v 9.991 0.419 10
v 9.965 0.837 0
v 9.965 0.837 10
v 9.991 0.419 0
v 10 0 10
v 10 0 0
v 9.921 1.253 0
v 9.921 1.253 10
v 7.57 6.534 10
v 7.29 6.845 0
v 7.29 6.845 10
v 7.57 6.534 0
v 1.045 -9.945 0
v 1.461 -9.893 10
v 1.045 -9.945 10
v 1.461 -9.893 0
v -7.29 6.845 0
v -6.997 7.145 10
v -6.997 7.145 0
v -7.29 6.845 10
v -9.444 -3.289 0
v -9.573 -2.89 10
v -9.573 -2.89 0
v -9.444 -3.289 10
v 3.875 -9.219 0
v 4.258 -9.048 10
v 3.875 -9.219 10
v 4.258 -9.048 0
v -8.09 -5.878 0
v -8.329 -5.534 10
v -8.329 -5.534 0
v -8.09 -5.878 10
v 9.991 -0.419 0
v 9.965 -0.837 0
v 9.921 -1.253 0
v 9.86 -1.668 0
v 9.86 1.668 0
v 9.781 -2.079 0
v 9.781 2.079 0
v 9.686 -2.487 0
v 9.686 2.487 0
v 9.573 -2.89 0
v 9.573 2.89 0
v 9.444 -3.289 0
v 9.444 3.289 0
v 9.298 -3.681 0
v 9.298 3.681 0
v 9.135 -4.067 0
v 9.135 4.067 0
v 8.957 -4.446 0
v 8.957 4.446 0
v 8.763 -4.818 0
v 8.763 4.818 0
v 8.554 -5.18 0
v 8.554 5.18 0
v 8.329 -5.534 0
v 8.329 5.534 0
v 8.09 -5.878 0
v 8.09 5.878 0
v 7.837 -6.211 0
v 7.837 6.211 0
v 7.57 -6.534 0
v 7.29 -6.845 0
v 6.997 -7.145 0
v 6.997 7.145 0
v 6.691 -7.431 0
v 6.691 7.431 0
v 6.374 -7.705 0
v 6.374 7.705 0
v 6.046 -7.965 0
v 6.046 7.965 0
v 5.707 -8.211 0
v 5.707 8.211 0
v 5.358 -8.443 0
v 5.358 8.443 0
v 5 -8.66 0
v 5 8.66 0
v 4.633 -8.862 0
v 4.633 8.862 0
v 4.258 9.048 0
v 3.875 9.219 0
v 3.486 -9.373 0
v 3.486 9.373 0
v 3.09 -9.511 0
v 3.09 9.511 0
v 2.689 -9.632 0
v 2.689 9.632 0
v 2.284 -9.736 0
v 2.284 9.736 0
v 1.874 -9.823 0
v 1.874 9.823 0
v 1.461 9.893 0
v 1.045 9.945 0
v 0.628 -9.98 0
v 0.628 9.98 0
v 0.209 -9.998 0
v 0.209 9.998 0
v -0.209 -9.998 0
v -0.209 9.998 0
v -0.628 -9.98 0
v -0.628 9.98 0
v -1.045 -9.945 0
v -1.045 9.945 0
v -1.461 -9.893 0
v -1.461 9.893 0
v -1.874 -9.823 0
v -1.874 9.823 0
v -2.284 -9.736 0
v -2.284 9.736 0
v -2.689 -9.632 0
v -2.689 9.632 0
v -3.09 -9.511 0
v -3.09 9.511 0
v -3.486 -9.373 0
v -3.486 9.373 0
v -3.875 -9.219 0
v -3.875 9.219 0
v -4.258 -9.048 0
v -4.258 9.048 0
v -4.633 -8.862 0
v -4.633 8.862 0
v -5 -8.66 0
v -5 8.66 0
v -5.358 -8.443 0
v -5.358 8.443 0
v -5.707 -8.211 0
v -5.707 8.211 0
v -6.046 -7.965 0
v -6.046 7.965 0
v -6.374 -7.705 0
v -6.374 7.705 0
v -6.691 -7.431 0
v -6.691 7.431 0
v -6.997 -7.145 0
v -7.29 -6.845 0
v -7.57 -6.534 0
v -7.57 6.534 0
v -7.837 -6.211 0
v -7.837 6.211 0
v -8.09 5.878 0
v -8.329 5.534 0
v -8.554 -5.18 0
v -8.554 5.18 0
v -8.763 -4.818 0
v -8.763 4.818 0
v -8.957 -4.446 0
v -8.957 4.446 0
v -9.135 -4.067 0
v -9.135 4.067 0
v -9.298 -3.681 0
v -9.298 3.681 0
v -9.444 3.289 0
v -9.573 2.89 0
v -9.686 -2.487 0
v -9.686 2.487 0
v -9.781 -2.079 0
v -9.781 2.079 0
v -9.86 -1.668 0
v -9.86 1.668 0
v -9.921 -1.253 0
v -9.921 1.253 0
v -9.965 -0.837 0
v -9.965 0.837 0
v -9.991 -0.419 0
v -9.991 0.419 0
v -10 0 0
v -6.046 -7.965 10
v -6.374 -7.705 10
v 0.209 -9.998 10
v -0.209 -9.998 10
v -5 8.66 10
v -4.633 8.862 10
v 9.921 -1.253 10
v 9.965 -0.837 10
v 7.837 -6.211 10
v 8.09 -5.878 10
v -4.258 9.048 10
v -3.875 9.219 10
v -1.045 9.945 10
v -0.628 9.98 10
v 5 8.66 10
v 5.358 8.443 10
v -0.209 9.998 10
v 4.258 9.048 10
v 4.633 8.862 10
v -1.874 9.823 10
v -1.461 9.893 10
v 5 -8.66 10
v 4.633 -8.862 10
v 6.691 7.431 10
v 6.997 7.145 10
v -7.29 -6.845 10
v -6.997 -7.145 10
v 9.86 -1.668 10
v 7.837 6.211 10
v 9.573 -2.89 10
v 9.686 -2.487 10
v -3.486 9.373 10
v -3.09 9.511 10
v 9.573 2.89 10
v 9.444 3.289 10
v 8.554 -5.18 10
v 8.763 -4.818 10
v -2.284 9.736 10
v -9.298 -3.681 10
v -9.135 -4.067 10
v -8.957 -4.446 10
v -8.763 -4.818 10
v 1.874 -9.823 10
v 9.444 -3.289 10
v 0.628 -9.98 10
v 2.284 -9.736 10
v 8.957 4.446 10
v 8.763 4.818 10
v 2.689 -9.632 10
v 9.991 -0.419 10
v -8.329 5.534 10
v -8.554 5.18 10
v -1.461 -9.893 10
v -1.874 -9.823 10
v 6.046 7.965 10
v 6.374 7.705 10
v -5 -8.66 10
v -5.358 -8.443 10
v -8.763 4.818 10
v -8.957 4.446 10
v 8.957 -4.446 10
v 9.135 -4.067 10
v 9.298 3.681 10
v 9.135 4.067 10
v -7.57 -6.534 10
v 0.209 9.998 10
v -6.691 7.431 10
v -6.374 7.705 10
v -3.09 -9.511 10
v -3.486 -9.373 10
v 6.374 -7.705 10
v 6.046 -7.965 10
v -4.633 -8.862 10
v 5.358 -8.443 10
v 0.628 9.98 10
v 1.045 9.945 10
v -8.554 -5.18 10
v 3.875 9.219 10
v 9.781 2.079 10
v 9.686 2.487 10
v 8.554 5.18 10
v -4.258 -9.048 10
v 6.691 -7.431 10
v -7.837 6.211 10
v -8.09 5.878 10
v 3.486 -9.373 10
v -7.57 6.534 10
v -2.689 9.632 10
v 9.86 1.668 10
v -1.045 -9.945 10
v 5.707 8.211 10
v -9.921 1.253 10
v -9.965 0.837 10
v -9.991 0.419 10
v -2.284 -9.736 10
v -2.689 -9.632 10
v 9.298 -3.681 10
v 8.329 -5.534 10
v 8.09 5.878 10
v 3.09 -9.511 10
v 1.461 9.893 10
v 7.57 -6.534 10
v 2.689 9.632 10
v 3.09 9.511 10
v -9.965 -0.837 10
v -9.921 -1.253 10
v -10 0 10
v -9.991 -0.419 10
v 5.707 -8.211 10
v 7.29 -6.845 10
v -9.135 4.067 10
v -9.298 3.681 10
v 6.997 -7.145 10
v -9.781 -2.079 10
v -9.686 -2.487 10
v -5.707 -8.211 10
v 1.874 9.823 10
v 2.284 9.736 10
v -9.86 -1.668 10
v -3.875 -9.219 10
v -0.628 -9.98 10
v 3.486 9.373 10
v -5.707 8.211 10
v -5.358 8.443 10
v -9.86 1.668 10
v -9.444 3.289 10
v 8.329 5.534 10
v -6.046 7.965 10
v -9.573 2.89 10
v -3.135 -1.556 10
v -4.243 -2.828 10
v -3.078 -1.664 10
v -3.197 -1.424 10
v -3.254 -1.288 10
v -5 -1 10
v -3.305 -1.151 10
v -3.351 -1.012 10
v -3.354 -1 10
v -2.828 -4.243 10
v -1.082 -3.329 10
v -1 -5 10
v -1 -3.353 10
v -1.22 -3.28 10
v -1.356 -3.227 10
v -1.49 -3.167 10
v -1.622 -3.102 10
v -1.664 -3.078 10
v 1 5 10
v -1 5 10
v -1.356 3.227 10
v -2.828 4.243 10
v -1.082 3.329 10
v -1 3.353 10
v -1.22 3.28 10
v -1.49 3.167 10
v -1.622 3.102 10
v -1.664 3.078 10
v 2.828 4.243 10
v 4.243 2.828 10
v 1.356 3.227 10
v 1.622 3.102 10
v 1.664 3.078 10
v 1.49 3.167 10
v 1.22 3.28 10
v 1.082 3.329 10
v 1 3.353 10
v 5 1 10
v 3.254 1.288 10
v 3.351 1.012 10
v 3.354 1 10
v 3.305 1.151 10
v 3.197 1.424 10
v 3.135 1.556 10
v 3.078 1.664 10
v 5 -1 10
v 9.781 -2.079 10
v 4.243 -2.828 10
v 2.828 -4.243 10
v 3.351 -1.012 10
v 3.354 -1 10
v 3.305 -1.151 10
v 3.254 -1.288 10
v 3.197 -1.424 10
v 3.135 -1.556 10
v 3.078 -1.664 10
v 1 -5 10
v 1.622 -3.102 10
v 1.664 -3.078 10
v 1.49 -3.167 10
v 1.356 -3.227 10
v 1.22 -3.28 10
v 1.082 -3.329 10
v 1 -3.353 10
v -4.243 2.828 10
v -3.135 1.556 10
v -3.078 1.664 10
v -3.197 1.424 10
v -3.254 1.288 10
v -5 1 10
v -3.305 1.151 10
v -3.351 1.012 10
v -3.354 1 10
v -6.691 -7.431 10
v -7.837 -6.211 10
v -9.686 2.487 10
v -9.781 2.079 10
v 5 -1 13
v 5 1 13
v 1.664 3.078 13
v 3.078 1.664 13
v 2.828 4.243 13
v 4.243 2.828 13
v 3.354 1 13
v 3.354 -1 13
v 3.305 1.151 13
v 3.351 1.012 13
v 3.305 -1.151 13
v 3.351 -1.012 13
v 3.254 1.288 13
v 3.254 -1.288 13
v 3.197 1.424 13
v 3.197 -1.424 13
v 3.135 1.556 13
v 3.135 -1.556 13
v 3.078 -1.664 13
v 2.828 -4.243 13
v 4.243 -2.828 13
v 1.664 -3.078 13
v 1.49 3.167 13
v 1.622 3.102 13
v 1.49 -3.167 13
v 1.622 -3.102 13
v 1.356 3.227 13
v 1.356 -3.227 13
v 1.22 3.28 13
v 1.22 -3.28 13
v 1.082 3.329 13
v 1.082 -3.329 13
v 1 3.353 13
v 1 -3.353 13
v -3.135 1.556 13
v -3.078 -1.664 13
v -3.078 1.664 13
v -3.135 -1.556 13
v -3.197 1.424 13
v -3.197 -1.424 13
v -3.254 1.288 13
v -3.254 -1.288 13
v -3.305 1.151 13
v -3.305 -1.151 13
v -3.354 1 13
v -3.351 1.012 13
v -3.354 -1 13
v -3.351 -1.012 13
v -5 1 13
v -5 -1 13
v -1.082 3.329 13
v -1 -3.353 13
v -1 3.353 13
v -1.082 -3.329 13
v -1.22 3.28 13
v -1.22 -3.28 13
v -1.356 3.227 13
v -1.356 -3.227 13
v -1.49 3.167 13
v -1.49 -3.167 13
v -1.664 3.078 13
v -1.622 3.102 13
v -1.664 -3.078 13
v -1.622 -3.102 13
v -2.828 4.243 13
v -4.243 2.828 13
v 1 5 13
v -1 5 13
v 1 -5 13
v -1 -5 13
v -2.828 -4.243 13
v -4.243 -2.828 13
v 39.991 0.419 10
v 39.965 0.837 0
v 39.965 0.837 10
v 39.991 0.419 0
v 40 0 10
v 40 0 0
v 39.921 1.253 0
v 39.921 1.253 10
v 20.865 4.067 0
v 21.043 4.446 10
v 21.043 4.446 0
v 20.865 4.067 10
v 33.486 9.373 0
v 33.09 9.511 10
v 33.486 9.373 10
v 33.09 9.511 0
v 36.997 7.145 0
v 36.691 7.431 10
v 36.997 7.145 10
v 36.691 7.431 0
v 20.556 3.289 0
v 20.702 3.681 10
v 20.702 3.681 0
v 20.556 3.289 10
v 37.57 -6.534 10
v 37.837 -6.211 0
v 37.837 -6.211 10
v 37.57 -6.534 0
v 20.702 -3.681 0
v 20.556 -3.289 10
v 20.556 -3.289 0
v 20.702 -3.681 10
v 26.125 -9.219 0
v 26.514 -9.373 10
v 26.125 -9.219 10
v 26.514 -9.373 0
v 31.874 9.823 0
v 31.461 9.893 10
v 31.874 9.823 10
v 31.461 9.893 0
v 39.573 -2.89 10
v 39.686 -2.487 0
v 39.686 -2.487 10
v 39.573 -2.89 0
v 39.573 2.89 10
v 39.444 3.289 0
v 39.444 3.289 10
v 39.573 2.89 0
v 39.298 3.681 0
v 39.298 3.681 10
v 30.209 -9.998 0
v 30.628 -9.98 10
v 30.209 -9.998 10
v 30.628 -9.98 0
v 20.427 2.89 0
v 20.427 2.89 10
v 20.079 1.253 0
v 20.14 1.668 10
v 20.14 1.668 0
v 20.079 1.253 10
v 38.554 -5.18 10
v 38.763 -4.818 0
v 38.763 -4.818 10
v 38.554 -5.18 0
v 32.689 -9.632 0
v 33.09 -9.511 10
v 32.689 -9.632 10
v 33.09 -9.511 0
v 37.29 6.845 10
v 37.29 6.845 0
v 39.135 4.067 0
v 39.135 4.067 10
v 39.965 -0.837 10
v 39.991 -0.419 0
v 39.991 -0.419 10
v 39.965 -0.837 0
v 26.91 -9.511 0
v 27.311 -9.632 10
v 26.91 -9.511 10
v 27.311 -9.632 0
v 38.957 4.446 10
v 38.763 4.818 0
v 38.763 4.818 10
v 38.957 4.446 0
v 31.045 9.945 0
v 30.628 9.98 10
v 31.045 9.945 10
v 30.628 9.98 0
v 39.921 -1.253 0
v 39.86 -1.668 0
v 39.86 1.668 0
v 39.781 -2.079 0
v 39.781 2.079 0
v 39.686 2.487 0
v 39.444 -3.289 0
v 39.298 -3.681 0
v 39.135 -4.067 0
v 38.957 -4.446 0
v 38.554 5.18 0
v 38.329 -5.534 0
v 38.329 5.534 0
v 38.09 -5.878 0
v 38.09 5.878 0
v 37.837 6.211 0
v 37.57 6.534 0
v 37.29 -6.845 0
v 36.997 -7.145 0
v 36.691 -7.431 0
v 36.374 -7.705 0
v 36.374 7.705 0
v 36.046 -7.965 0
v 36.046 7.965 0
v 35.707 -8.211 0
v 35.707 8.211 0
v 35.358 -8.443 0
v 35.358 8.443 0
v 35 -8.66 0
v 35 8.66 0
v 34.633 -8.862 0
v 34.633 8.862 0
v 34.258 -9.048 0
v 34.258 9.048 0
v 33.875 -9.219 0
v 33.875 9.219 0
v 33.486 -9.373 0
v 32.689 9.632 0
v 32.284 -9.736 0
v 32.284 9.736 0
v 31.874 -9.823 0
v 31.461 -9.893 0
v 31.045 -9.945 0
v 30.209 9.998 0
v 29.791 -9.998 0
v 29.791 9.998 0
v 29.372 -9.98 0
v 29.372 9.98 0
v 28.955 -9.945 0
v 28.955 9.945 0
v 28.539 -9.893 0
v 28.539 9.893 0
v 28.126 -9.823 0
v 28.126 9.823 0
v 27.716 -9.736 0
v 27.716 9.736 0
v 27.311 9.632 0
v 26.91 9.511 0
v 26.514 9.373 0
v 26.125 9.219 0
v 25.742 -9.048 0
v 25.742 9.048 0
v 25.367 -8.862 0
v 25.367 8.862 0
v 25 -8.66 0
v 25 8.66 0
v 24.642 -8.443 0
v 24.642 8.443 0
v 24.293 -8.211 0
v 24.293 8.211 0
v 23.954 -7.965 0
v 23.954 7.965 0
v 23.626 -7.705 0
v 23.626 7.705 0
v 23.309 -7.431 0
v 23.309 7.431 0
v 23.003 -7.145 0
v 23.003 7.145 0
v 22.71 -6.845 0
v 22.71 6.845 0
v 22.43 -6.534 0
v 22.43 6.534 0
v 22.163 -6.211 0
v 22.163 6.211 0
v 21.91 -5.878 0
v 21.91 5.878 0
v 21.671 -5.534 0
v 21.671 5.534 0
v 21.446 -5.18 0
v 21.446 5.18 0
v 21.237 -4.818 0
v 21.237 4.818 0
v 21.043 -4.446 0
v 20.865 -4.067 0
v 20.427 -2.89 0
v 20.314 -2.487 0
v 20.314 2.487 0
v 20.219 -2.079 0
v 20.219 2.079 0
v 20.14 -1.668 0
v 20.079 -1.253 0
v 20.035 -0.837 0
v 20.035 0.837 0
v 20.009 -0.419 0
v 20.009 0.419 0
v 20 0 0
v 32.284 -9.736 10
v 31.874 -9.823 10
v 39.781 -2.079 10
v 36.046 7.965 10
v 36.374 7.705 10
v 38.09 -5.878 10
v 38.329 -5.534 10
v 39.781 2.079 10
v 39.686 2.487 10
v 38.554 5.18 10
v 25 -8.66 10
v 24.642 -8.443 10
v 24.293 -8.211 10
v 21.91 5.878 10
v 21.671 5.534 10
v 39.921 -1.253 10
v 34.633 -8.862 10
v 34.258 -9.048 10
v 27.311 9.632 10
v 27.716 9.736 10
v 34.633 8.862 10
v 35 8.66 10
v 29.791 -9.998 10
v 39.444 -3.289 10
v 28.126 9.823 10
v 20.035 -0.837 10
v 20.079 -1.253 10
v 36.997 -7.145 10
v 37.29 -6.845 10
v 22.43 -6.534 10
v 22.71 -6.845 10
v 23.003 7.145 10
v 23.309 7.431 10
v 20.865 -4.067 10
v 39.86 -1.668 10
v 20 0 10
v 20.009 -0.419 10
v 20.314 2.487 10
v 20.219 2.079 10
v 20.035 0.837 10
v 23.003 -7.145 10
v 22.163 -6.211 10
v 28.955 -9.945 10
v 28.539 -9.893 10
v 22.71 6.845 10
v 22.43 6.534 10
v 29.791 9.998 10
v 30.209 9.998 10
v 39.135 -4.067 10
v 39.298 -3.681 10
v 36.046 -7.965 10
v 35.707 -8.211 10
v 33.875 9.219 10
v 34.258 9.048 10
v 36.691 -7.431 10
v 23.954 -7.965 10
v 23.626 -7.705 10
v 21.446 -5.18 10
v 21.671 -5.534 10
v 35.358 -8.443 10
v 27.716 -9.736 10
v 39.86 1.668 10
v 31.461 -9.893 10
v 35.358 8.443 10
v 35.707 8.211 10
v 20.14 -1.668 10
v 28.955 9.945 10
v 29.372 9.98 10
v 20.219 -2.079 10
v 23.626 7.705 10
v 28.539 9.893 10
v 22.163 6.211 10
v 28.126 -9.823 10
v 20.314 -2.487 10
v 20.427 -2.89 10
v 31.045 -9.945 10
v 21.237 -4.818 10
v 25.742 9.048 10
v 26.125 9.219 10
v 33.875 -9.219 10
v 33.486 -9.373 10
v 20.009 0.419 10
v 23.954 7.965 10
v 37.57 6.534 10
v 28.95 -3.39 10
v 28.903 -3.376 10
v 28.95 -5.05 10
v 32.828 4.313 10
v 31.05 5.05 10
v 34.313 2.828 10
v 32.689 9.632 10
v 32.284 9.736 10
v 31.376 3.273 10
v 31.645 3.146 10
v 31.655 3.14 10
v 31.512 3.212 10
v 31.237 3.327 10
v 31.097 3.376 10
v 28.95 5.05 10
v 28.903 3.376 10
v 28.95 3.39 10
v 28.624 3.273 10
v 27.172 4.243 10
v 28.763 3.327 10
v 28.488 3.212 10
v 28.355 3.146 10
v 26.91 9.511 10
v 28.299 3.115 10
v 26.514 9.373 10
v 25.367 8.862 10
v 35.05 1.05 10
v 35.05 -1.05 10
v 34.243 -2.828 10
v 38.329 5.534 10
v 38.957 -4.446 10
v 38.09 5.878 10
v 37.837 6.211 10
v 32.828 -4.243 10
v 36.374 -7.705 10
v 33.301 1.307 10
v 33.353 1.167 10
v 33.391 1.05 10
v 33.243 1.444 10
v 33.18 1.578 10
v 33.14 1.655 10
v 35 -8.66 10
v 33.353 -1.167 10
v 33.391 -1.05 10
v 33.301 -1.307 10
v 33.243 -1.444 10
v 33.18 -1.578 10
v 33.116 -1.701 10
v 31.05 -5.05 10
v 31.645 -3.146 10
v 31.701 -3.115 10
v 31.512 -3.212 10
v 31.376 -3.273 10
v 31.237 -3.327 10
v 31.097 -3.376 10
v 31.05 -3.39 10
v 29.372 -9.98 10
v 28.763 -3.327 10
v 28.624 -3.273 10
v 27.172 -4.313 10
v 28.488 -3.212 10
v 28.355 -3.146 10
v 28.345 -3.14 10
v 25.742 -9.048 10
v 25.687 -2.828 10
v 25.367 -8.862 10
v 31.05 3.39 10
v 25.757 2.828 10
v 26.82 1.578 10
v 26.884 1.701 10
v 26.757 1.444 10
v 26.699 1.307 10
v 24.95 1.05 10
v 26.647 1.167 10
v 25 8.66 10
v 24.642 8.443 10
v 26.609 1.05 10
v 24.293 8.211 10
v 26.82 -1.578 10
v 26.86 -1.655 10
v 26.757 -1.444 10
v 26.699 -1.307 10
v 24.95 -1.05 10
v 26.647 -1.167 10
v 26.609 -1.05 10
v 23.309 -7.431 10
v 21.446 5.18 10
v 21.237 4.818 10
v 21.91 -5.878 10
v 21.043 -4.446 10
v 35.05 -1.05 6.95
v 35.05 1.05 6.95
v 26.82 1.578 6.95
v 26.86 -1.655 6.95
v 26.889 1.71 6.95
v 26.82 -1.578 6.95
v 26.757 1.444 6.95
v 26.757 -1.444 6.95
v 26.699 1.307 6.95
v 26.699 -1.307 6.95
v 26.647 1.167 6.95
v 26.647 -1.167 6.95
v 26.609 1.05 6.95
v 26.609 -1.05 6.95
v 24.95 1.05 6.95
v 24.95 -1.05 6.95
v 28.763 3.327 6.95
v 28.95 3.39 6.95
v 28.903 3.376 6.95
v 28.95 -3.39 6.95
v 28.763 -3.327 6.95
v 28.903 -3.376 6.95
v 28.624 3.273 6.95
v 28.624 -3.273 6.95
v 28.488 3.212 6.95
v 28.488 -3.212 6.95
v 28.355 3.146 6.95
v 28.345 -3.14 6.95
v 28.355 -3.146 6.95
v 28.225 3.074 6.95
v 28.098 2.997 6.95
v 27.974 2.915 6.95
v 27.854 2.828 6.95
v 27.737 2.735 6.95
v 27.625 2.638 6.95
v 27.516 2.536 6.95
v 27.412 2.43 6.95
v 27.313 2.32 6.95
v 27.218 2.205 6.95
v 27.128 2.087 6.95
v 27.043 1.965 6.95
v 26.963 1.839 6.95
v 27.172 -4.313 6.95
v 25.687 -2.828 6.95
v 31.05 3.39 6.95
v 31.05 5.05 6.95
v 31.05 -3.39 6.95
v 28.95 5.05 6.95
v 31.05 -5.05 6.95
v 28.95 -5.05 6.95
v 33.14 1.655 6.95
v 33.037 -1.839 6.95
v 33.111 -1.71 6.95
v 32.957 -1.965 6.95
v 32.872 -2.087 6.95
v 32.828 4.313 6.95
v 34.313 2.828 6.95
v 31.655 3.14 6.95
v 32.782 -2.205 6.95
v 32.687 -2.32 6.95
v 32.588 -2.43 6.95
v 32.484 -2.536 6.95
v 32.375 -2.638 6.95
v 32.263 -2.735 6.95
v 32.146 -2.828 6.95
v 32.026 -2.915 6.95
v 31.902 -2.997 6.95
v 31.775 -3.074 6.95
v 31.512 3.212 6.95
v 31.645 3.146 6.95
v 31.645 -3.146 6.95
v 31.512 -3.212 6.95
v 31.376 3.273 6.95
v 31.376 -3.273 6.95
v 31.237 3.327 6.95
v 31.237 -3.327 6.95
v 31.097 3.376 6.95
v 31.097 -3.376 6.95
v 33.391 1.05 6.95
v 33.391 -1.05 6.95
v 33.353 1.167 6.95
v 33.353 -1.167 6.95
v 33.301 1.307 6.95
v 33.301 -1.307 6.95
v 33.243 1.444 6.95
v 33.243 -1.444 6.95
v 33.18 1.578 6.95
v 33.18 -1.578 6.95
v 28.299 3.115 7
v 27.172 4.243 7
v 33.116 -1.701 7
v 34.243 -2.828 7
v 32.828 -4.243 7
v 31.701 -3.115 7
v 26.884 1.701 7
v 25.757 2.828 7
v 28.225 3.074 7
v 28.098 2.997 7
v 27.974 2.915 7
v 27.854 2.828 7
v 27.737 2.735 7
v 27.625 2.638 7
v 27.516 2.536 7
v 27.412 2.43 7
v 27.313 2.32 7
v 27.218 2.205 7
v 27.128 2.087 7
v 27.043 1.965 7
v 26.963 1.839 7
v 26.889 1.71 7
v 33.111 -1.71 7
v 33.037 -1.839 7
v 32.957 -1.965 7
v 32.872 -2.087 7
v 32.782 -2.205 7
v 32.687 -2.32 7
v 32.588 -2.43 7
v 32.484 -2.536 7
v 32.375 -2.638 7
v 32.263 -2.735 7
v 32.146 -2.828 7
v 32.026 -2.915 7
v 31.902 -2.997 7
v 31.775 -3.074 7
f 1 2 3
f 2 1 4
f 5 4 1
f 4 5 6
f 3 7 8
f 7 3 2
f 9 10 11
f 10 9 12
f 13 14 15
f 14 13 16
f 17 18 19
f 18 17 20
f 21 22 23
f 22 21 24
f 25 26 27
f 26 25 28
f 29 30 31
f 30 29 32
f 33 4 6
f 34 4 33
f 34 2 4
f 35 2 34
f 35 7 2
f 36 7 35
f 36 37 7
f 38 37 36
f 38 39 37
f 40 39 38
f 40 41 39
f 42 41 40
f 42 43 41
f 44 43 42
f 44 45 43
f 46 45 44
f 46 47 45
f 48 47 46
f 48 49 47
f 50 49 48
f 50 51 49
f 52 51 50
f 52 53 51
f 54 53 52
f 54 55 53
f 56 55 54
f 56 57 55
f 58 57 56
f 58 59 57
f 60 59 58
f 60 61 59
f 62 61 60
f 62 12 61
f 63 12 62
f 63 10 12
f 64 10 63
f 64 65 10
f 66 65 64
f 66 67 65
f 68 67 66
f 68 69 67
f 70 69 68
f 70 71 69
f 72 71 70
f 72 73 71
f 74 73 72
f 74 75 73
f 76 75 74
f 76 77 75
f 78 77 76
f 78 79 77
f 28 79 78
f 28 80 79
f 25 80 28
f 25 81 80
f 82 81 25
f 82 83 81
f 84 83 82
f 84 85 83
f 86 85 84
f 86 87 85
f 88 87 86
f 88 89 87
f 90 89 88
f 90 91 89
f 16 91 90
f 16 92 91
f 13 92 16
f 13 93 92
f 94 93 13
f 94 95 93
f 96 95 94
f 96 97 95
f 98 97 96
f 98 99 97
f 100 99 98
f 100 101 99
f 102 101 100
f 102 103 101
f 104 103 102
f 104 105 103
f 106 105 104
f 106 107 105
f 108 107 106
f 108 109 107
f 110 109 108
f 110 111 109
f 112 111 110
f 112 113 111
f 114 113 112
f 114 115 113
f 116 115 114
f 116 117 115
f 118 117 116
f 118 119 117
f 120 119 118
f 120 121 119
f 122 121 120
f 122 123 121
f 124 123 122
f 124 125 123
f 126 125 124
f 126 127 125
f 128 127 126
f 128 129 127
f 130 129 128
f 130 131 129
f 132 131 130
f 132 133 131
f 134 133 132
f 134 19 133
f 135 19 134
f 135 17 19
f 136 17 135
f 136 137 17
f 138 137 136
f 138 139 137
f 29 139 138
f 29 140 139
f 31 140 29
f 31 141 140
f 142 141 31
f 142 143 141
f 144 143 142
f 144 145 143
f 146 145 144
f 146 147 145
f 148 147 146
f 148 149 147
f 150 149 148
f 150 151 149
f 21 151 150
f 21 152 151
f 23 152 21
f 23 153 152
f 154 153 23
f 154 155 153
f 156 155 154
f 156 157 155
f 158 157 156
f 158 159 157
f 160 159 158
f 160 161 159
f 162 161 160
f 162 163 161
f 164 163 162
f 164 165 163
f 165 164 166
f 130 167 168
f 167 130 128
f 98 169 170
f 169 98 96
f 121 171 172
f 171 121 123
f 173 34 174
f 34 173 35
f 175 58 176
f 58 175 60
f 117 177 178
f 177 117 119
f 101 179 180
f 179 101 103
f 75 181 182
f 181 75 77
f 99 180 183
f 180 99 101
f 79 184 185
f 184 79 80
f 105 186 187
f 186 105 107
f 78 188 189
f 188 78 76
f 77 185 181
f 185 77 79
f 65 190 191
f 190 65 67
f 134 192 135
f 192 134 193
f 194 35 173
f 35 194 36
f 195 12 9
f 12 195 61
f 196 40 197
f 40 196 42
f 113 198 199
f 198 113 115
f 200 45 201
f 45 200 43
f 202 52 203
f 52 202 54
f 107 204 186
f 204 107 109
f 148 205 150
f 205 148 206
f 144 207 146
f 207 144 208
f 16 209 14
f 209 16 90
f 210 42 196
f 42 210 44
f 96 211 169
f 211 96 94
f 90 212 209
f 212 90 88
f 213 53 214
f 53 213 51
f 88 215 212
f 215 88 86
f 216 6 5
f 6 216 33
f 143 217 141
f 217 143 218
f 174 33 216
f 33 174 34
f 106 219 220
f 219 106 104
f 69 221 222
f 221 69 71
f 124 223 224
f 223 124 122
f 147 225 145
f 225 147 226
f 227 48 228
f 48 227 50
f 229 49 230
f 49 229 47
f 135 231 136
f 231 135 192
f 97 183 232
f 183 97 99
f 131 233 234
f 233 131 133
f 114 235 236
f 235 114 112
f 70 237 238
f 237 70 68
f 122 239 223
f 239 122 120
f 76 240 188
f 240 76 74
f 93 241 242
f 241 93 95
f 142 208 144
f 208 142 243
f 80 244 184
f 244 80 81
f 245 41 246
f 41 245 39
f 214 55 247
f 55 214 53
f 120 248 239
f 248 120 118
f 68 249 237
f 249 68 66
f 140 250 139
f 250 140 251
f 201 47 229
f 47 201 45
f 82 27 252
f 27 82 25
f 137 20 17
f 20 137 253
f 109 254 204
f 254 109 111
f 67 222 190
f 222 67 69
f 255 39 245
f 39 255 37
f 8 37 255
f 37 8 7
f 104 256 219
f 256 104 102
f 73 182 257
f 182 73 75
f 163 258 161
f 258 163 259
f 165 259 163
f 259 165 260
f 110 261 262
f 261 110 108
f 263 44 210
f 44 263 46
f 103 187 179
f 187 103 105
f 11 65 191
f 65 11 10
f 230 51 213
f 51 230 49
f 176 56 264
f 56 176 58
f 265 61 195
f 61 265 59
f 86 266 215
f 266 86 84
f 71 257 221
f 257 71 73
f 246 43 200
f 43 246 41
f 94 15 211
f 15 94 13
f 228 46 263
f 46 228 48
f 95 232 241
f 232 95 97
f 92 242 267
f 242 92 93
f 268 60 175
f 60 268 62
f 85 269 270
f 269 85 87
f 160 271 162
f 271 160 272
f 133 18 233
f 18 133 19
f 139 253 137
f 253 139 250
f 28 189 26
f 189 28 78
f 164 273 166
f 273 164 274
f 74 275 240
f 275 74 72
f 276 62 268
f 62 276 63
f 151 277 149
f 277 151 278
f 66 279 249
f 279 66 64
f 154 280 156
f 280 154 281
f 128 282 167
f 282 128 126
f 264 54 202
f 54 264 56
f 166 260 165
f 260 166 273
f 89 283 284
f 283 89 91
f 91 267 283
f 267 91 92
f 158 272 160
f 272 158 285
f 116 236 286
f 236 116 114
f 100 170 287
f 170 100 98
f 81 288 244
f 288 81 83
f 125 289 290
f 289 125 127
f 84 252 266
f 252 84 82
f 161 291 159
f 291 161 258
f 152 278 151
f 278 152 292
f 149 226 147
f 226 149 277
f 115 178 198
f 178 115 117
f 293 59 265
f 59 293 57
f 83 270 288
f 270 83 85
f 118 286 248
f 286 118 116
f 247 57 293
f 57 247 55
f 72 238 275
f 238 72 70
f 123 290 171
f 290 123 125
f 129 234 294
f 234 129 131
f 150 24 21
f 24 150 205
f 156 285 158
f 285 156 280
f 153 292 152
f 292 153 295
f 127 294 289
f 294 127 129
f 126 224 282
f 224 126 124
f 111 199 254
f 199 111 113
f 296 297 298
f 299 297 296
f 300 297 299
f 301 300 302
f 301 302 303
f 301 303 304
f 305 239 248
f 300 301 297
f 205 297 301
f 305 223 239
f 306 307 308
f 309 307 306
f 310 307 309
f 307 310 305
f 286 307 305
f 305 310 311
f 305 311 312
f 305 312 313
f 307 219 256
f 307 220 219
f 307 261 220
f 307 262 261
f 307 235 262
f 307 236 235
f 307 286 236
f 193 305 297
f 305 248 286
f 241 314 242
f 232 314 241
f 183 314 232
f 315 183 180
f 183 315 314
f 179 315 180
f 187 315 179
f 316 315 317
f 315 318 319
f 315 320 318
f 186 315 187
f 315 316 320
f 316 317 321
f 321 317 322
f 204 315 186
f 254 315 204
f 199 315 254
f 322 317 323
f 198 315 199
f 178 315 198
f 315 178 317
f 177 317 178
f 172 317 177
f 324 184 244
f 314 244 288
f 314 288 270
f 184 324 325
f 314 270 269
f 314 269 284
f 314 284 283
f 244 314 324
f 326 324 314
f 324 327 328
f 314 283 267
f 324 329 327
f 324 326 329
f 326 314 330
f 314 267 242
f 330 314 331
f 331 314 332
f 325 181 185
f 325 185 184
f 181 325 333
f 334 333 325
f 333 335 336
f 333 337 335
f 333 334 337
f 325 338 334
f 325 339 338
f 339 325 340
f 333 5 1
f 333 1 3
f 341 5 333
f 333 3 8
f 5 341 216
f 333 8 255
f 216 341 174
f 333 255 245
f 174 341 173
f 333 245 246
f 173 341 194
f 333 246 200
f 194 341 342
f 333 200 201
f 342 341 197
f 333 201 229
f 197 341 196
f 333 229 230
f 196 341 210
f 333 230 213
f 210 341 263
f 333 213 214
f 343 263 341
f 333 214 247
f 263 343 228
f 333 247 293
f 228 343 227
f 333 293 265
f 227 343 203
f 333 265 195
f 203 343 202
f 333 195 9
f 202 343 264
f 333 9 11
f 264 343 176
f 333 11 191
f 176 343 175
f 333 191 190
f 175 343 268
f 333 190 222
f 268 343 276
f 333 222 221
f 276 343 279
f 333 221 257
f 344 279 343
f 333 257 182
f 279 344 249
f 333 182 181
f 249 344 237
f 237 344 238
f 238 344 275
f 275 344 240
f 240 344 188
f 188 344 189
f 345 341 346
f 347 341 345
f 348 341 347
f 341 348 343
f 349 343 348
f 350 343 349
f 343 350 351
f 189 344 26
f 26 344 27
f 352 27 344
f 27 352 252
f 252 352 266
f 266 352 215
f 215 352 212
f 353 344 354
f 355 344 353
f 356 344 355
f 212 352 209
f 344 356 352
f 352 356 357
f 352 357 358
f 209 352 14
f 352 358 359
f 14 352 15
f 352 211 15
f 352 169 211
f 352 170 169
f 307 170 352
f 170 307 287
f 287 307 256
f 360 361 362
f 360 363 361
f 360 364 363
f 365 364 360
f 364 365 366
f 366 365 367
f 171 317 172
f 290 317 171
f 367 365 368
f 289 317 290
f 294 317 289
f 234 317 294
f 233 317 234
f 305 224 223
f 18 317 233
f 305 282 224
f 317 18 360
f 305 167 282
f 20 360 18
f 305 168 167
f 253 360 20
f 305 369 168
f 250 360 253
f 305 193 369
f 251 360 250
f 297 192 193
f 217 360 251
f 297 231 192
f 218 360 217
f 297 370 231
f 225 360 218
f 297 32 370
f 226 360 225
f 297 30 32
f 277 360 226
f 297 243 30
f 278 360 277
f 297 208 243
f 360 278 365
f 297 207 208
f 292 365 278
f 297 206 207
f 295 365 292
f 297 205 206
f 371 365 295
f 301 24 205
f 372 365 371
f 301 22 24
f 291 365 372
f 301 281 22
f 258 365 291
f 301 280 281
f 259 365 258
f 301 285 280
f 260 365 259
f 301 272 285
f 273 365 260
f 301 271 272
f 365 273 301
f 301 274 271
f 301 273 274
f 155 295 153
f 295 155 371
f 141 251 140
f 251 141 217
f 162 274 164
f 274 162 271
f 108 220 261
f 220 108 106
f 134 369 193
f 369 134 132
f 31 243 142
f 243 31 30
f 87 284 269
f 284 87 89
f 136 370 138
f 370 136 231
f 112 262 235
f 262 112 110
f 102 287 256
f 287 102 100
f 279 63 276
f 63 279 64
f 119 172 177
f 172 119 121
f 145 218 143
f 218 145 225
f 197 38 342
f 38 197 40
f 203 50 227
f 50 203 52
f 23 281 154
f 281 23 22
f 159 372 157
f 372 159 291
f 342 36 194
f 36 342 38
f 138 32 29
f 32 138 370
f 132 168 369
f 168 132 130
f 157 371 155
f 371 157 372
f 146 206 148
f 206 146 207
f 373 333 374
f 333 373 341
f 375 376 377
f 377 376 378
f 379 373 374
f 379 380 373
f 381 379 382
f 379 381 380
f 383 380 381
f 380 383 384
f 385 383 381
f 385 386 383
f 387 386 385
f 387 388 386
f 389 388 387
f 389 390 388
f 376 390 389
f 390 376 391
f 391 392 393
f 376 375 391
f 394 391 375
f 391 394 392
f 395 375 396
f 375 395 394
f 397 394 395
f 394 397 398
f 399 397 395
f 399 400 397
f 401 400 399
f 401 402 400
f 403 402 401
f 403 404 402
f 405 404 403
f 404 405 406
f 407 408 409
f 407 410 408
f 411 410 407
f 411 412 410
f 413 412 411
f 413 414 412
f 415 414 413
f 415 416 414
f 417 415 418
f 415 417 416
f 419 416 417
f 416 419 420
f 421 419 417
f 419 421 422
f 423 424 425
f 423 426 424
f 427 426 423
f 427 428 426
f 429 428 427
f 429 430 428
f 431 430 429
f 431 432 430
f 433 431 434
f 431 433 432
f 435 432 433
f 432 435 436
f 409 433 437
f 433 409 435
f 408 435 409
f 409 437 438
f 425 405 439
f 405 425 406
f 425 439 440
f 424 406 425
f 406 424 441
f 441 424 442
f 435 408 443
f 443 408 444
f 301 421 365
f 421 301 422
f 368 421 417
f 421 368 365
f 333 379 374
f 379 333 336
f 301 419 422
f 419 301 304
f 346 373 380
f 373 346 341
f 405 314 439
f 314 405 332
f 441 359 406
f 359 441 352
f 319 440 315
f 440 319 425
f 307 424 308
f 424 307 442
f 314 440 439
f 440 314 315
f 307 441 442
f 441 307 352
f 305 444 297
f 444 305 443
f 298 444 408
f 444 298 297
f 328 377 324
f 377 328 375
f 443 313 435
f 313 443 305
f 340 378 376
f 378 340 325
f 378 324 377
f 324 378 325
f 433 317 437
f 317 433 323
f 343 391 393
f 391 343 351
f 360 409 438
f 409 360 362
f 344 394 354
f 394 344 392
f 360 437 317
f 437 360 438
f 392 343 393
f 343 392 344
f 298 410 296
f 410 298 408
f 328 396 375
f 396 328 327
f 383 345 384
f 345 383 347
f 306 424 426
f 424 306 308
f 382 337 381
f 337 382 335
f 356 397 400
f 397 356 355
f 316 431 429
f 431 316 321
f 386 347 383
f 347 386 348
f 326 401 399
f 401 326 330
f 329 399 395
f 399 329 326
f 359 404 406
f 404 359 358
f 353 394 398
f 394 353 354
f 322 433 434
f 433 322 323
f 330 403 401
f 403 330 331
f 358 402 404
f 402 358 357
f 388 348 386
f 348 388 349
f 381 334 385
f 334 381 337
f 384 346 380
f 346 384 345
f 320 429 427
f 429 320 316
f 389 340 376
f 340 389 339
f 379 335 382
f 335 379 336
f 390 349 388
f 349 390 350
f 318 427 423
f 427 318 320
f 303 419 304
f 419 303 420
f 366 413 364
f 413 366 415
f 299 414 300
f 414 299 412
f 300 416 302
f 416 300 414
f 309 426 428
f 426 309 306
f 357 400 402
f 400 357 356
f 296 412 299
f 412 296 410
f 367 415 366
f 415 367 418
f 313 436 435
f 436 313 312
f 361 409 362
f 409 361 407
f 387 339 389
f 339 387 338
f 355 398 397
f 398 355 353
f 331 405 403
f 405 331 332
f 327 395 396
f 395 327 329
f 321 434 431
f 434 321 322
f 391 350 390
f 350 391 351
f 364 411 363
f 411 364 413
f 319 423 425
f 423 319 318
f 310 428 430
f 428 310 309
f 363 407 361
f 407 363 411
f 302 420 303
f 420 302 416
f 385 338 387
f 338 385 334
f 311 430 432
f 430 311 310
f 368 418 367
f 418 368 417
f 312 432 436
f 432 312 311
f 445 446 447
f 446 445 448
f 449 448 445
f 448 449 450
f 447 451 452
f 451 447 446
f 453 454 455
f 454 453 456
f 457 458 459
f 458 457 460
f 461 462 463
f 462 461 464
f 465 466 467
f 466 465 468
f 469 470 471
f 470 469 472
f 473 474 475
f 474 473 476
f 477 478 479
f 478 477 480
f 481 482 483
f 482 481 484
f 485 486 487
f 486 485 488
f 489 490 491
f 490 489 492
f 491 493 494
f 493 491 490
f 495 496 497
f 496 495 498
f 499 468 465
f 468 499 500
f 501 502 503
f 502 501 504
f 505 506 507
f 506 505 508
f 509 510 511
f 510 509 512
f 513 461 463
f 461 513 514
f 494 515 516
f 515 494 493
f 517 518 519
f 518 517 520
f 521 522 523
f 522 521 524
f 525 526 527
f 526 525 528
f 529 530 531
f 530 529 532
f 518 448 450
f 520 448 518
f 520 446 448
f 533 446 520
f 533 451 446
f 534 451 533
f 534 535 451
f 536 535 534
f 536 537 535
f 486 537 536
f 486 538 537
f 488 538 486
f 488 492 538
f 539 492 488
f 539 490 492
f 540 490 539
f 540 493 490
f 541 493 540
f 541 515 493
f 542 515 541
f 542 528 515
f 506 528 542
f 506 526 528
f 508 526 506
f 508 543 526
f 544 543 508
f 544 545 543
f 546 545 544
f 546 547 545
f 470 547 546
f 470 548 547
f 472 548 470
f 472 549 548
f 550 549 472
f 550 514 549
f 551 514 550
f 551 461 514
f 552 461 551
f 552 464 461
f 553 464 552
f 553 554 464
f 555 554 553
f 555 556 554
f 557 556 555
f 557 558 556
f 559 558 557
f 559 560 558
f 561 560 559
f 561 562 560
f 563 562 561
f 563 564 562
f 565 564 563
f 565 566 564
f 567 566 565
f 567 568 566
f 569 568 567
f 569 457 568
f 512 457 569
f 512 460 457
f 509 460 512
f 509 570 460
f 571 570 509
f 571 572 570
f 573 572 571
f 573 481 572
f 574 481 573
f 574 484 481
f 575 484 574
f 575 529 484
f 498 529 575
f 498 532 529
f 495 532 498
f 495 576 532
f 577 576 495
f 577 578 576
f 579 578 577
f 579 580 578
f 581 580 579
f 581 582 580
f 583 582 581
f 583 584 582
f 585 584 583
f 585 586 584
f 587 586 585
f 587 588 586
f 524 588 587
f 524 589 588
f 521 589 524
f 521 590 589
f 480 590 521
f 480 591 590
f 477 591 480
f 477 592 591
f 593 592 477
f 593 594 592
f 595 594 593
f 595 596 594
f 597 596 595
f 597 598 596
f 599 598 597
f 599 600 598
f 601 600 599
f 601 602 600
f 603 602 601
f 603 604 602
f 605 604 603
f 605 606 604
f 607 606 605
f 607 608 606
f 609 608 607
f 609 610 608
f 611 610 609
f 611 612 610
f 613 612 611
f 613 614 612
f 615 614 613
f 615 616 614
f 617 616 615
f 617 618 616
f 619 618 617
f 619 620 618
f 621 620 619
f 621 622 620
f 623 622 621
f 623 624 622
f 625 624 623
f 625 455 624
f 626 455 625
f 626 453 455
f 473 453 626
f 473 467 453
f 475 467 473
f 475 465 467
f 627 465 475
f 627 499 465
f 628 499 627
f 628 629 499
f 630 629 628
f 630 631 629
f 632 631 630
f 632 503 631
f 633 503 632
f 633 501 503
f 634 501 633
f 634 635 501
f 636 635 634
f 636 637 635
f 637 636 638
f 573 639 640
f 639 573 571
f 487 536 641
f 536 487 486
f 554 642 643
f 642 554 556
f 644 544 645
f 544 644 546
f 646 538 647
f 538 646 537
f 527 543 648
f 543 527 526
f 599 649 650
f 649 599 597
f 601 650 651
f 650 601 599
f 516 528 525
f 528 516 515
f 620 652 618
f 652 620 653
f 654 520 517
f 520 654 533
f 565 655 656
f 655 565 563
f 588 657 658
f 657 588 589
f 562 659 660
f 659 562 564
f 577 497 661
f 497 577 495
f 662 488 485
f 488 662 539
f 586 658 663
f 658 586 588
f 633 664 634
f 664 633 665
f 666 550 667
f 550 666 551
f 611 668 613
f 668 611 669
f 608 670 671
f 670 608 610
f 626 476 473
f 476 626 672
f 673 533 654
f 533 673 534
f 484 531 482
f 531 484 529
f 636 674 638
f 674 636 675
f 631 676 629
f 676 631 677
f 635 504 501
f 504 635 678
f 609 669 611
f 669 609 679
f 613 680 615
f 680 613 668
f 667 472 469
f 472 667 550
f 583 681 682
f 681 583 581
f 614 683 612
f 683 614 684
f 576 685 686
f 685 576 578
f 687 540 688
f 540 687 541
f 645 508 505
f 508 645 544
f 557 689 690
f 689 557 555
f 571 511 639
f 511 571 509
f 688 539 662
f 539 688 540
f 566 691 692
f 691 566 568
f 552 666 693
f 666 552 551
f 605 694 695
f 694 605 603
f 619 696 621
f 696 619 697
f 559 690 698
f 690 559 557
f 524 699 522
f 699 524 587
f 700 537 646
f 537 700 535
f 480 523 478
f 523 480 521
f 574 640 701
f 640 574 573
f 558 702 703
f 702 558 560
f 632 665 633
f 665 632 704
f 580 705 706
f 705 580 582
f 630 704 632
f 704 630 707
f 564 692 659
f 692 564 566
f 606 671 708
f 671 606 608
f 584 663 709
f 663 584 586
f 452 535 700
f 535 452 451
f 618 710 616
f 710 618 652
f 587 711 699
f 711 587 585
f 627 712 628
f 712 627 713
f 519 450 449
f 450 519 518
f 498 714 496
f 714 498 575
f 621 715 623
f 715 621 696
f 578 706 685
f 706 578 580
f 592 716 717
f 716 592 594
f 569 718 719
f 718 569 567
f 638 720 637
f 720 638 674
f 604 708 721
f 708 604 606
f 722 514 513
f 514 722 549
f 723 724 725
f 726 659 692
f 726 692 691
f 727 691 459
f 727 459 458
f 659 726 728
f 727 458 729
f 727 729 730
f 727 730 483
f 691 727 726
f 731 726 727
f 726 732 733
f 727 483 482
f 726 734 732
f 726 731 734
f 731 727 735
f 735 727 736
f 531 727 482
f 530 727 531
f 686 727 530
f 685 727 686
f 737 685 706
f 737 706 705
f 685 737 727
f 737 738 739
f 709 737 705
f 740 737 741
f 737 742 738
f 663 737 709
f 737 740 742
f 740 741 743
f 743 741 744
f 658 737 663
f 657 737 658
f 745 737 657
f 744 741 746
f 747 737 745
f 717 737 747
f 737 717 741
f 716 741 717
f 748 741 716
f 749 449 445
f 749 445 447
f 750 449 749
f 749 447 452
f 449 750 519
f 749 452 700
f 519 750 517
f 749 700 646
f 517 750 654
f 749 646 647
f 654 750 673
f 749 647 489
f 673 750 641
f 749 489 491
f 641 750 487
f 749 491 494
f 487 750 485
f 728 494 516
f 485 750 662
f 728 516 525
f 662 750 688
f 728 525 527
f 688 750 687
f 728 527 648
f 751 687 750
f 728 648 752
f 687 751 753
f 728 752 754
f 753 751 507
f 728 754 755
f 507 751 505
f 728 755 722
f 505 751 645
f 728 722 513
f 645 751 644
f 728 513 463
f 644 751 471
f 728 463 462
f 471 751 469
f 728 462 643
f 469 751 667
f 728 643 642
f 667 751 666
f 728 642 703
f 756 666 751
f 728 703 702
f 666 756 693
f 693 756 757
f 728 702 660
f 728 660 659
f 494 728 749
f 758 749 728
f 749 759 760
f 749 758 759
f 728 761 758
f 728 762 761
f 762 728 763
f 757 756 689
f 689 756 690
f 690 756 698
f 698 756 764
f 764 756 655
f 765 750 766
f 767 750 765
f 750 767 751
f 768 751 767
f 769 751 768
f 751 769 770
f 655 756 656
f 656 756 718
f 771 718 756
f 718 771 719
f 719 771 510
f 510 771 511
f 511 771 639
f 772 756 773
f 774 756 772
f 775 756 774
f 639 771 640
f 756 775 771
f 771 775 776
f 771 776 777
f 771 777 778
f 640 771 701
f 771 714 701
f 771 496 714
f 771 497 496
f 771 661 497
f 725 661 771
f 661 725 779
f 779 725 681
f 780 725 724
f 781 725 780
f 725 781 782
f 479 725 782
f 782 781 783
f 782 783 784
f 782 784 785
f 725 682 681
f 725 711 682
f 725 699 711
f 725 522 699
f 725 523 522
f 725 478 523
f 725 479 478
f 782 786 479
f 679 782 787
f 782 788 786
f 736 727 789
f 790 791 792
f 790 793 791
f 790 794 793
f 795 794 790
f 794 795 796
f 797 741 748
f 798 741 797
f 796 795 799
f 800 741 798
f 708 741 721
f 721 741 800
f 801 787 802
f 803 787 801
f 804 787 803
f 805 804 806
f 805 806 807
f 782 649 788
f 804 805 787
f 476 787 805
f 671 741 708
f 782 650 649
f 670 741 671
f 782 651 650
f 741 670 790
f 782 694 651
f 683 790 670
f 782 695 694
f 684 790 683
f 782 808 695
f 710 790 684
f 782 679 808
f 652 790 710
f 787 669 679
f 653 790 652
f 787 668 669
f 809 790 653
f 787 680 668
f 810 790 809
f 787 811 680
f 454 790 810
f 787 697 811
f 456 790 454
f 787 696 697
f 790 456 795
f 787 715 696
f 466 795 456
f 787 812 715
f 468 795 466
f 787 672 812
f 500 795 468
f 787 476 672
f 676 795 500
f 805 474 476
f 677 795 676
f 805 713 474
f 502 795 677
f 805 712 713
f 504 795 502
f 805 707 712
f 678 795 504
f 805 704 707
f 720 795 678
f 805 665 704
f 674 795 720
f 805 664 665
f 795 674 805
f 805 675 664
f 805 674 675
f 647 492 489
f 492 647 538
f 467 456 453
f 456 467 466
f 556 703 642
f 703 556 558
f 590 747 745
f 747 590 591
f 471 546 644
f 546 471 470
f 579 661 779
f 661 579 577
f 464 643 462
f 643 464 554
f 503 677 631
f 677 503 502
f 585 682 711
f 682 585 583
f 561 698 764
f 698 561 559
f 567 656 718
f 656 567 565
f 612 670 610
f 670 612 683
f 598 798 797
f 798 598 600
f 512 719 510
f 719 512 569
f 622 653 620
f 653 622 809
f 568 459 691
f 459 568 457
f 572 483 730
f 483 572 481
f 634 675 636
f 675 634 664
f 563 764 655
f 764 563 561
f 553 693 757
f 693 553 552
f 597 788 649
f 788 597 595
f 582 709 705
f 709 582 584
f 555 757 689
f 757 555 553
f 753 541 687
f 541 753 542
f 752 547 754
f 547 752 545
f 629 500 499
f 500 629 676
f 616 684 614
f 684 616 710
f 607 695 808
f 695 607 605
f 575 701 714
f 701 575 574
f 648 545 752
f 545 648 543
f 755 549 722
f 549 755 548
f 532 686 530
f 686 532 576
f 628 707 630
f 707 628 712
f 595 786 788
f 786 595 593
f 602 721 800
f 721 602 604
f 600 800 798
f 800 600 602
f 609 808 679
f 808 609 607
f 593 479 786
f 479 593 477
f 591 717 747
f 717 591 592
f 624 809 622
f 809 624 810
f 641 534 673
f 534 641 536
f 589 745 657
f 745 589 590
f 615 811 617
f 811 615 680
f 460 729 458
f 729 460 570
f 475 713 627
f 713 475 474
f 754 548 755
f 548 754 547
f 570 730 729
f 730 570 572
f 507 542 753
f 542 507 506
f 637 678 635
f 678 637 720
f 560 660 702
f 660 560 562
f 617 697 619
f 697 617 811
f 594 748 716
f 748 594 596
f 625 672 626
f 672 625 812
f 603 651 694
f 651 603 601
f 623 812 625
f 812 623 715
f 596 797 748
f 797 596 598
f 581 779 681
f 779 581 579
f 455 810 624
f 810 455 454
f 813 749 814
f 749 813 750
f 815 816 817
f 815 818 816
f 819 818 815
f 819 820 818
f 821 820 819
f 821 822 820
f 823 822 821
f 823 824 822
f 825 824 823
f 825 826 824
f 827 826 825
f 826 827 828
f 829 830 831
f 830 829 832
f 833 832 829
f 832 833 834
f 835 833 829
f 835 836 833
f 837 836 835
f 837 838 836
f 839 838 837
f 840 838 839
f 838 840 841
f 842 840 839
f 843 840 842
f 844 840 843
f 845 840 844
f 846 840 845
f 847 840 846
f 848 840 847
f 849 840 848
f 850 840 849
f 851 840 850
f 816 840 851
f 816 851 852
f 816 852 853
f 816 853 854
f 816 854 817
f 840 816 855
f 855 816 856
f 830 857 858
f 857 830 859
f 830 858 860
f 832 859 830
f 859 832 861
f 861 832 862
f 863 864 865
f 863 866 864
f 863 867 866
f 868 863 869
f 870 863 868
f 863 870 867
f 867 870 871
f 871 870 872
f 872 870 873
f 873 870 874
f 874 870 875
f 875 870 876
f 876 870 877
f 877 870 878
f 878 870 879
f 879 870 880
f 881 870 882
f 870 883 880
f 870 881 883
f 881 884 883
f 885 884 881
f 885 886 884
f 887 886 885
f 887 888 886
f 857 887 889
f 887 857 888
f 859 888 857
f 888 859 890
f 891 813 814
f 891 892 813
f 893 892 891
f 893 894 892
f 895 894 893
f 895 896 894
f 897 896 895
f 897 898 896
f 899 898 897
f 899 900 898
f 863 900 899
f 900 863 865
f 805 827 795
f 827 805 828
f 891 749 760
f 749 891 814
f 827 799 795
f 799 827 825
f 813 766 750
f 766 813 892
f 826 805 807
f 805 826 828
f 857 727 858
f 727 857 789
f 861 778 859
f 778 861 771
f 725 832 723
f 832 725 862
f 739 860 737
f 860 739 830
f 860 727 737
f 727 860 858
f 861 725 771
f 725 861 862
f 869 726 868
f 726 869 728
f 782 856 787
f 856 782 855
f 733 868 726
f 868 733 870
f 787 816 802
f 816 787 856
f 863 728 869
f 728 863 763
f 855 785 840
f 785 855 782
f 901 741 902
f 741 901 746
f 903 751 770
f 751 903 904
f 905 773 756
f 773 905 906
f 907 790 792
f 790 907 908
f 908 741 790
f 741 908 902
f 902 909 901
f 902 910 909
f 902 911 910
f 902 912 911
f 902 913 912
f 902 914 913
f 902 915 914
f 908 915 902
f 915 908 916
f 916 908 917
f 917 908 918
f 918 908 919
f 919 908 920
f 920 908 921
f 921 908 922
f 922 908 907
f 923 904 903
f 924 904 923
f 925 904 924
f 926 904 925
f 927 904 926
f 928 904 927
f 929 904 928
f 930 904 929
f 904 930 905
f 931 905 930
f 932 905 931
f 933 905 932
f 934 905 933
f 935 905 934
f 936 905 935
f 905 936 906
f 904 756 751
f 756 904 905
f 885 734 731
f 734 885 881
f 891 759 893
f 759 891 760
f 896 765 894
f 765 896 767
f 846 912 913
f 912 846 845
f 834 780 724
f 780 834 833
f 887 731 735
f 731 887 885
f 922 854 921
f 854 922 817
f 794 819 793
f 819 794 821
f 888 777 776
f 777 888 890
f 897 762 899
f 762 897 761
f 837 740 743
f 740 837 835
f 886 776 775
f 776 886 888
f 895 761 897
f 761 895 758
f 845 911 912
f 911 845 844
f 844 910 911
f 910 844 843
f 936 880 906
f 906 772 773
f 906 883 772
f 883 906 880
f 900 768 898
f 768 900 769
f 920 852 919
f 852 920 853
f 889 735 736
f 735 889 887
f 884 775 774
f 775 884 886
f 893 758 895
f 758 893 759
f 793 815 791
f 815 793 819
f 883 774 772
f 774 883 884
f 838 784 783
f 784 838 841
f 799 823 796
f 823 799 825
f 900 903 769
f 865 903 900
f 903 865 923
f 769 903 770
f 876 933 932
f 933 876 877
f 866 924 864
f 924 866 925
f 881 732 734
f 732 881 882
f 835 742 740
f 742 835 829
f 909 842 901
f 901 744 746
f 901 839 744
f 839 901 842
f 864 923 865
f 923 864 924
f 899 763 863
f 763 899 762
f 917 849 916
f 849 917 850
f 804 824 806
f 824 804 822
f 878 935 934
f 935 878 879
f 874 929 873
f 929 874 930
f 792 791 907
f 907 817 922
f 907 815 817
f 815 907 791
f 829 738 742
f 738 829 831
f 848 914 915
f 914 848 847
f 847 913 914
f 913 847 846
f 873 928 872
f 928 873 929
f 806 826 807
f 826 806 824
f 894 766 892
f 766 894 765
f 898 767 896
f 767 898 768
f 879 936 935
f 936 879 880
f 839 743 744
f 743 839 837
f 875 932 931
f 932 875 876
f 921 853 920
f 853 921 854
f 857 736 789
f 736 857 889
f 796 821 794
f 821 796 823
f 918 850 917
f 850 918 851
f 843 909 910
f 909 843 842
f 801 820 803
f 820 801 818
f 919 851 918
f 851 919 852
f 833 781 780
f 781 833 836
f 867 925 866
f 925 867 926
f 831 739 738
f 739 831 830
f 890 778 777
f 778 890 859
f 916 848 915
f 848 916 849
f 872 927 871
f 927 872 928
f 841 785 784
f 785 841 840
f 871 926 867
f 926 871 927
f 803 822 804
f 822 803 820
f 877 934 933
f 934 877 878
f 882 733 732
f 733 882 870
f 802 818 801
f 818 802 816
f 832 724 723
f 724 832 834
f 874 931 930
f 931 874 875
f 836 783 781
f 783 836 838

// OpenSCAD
$fn = 150;
h = 10;
d = 20;

hw = 6;
dw = 10;
w = 2;
union(){
    //main cylinder
    cylinder(d=d,h=h);
    
    //tooth
    translate([0,0,dw])
    cube([dw,w,hw],center=true);
    translate([0,0,dw])
    cube([w,dw,hw],center=true);

    rotate(45)
    translate([0,0,dw])
    cube([dw,w,hw],center=true);
    rotate(45)
    translate([0,0,dw])
    cube([w,dw,hw],center=true);
    
    //little cylinder in the center
    translate([0,0,dw])
    cylinder(d=7,hw,center=true);
}

error = 0.1;
difference(){
    translate([30,0,0])
    cylinder(d=d,h=h);
    //tooth
    translate([30,0,10])
    cube([dw+error,w+error,hw+error],center=true);
    translate([30,0,10])
    cube([w+error,dw+error,hw+error],center=true);
    translate([30,0,10])
    rotate(45)
    cube([dw+error,w+error,hw+error],center=true);
    translate([30,0,10])
    rotate(45)
    cube([w,dw,hw],center=true);
    
    //little cylinder in the center
    translate([30,0,10])
    cylinder(d=7+error,h=6+error,center=true);
    
    }
